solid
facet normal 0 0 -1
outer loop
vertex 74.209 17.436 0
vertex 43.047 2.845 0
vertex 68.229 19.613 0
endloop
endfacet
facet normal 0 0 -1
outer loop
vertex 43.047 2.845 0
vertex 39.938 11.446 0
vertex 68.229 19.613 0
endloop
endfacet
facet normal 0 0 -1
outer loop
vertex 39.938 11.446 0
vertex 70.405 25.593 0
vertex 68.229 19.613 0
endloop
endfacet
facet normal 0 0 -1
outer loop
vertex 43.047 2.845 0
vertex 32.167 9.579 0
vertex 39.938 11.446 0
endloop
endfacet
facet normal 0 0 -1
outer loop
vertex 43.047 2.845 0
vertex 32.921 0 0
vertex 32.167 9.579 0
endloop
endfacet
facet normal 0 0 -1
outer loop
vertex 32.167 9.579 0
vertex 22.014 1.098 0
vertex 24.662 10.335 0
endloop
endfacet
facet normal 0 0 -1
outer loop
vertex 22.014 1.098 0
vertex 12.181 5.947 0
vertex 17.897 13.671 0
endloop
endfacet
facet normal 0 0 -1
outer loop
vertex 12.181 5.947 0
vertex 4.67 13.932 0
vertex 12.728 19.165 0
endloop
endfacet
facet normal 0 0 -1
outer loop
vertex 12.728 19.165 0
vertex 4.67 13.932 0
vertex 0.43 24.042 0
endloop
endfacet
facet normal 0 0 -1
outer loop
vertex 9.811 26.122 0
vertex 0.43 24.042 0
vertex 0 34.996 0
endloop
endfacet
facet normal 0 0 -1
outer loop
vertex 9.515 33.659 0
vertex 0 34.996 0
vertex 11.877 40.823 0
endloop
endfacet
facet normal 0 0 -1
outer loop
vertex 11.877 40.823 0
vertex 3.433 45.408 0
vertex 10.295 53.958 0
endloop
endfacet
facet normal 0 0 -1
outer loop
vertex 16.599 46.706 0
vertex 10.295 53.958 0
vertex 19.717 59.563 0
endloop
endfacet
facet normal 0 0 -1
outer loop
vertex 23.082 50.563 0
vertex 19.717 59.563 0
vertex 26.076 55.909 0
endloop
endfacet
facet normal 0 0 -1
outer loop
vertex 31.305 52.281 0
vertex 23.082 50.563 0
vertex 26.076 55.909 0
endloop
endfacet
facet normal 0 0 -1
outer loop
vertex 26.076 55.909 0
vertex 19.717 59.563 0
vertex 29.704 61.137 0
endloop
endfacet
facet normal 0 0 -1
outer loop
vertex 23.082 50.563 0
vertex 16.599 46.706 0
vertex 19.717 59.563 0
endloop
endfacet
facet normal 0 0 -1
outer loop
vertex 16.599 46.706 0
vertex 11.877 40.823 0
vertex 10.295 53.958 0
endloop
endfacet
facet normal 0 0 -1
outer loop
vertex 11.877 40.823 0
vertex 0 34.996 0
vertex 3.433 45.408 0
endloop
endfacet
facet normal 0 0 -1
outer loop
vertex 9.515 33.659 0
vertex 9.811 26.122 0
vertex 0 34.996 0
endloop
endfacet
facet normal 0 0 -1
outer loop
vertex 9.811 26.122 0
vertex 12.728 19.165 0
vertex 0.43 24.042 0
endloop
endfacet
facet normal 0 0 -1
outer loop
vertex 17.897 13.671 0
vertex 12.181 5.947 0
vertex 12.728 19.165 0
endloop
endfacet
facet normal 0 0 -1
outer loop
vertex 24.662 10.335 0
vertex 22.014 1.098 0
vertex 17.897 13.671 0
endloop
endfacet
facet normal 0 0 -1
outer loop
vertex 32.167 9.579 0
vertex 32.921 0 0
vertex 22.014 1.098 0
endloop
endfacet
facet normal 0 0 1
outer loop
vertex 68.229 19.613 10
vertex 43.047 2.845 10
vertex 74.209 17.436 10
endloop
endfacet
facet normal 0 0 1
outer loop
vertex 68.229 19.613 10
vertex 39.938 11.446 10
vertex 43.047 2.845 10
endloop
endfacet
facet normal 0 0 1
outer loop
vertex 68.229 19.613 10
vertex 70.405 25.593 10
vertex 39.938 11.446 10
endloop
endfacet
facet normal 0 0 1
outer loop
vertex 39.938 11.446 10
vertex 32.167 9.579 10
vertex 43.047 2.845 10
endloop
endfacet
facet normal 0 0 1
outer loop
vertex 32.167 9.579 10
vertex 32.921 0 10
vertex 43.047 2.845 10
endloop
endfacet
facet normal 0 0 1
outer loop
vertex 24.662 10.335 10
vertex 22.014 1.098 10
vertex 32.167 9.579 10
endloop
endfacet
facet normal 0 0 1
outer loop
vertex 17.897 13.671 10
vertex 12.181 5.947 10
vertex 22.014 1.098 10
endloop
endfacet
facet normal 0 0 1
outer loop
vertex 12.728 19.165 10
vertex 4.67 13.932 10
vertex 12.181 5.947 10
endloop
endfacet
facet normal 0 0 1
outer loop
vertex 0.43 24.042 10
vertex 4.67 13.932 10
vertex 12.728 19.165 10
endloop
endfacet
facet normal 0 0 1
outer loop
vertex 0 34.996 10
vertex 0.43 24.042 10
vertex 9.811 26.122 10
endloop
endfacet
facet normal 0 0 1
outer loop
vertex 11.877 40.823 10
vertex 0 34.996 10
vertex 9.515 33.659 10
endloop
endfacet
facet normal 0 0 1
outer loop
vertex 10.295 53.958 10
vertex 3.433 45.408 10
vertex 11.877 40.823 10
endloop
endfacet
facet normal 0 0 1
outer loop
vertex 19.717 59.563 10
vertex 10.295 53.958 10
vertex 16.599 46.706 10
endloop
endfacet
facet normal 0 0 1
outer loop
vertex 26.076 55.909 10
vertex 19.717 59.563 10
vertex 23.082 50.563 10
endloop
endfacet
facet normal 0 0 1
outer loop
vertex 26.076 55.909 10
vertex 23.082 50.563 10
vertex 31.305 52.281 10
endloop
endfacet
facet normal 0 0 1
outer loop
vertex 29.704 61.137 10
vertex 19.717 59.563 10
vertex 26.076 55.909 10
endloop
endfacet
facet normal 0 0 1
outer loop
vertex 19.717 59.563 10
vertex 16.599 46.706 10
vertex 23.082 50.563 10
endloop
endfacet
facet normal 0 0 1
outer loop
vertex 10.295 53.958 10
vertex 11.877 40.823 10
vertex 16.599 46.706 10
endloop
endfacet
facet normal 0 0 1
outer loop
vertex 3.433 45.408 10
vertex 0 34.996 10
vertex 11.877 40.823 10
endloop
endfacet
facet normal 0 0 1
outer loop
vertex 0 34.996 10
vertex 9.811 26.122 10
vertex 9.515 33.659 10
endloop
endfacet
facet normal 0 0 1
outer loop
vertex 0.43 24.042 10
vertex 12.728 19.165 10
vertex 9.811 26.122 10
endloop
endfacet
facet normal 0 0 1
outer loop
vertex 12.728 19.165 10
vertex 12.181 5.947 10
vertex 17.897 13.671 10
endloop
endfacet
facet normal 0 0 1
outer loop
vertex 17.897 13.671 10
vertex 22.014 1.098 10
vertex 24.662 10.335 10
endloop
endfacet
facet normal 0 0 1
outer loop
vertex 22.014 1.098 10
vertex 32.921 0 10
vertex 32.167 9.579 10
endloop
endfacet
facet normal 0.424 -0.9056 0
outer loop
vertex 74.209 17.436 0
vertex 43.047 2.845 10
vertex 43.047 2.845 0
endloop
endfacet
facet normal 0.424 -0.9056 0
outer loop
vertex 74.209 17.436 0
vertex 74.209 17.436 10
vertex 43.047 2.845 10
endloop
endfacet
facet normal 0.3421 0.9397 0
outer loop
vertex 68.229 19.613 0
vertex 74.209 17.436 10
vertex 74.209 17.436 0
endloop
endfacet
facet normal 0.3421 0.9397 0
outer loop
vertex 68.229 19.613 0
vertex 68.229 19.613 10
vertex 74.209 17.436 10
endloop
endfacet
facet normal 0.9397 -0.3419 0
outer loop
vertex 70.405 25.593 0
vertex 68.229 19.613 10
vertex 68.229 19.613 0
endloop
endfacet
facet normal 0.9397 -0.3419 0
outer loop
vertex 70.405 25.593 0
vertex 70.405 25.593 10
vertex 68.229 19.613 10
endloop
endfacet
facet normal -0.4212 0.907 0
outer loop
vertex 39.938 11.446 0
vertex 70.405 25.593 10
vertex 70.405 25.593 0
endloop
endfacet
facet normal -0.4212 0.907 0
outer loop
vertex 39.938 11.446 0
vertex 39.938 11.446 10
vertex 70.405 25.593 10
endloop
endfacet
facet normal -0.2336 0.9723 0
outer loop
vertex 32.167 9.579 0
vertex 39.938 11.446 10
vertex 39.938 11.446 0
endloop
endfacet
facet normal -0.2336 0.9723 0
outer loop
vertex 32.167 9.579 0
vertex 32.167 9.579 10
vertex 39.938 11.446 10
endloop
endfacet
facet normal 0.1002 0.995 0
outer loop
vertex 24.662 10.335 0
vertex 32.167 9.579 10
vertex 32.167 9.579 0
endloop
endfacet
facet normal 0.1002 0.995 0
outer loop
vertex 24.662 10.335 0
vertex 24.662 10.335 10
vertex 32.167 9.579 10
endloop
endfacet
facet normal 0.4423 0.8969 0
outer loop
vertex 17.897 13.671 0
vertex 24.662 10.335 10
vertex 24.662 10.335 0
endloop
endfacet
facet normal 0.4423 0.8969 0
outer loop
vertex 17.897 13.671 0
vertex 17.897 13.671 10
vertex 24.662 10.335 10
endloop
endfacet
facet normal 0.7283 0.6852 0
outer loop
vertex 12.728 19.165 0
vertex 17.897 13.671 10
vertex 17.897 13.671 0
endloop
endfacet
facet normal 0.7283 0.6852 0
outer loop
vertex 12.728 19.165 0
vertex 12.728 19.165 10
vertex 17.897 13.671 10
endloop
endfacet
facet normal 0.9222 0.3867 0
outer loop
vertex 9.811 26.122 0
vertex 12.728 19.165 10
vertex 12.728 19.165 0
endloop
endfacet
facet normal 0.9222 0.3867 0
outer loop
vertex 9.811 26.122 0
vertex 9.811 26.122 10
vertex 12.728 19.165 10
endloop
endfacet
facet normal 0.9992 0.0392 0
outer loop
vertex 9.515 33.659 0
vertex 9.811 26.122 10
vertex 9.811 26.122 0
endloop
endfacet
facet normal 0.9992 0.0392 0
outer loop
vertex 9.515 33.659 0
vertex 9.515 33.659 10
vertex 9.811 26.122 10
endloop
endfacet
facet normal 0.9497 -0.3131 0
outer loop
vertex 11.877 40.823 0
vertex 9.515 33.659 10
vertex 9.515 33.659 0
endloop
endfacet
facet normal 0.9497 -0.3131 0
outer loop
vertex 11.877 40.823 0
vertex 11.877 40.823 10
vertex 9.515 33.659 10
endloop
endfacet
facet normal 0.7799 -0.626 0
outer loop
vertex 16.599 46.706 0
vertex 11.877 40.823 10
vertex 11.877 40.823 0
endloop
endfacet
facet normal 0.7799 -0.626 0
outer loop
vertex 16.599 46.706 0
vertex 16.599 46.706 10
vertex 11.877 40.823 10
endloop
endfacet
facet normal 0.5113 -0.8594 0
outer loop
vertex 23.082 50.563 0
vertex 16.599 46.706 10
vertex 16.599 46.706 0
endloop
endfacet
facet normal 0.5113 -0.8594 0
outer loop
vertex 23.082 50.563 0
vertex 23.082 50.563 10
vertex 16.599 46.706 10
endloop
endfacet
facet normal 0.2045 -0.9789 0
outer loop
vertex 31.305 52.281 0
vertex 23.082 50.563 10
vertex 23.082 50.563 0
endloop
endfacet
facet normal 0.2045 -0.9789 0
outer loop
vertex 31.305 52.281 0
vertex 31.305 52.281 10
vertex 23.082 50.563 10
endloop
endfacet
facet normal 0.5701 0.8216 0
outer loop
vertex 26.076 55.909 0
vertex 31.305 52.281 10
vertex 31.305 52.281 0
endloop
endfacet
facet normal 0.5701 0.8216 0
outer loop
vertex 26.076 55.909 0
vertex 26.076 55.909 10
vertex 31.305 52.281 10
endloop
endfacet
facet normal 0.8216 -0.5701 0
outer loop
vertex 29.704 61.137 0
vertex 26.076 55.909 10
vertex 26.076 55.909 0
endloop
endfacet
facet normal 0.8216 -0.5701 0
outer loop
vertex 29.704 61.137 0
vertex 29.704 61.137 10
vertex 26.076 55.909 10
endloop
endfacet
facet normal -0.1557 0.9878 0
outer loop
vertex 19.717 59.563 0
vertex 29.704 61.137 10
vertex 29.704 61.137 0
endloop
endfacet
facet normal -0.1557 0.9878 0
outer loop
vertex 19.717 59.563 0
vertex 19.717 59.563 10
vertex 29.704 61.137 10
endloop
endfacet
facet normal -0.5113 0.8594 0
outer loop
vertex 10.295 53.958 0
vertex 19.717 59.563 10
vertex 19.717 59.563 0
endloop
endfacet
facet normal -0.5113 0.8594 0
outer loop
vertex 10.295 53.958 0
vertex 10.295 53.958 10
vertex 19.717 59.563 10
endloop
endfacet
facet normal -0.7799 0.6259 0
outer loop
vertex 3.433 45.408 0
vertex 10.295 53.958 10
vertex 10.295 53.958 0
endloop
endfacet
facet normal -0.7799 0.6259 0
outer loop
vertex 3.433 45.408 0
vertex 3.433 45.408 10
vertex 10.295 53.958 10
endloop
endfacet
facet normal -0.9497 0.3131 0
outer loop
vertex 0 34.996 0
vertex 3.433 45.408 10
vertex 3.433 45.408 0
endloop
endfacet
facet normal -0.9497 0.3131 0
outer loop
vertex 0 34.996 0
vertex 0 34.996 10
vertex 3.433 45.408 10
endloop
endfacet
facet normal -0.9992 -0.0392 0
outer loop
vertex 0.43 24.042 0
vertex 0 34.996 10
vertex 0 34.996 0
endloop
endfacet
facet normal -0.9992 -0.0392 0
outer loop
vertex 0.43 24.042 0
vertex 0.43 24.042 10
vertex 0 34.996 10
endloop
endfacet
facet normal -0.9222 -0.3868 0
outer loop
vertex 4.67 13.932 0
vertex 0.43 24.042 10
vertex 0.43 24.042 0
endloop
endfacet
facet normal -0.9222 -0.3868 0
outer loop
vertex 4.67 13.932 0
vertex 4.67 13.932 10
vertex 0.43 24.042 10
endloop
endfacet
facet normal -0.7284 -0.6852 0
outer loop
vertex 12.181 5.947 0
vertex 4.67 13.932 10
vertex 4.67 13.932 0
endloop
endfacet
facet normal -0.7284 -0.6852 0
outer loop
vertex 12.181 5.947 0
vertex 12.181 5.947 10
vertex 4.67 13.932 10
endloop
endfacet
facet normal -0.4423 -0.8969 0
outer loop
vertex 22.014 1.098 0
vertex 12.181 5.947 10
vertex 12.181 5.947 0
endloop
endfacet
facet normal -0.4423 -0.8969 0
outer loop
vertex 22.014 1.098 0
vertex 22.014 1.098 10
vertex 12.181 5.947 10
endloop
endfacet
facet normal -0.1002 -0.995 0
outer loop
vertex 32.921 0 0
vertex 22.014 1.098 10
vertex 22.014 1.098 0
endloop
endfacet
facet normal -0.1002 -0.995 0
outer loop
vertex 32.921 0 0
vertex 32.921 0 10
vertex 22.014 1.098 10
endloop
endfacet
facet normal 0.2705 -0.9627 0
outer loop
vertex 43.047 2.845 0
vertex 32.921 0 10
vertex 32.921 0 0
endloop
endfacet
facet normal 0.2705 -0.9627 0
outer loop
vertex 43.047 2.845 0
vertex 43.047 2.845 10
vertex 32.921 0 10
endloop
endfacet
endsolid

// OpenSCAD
$fn = 32;

// ----------------------------------------------------------------------
// Hook plate: curl radius 26 mm over 205 degrees, 9 mm thick band
// ----------------------------------------------------------------------

// --- parameters (mm) ---
profile_height = 10;      // extrusion height
profile_points = 26;      // points of the closed outline

profile = [[26.076, 55.909], [29.704, 61.137], [19.717, 59.563], [10.295, 53.958], [3.433, 45.408], [0, 34.996], [0.43, 24.042], [4.67, 13.932], [12.181, 5.947], [22.014, 1.098], [32.921, 0], [43.047, 2.845], [74.209, 17.436], [68.229, 19.613], [70.405, 25.593], [39.938, 11.446], [32.167, 9.579], [24.662, 10.335], [17.897, 13.671], [12.728, 19.165], [9.811, 26.122], [9.515, 33.659], [11.877, 40.823], [16.599, 46.706], [23.082, 50.563], [31.305, 52.281]];  // single closed polygon, 26 points, counter clockwise

// --- the one profile operation ---
linear_extrude(height = profile_height) polygon(points = profile);
